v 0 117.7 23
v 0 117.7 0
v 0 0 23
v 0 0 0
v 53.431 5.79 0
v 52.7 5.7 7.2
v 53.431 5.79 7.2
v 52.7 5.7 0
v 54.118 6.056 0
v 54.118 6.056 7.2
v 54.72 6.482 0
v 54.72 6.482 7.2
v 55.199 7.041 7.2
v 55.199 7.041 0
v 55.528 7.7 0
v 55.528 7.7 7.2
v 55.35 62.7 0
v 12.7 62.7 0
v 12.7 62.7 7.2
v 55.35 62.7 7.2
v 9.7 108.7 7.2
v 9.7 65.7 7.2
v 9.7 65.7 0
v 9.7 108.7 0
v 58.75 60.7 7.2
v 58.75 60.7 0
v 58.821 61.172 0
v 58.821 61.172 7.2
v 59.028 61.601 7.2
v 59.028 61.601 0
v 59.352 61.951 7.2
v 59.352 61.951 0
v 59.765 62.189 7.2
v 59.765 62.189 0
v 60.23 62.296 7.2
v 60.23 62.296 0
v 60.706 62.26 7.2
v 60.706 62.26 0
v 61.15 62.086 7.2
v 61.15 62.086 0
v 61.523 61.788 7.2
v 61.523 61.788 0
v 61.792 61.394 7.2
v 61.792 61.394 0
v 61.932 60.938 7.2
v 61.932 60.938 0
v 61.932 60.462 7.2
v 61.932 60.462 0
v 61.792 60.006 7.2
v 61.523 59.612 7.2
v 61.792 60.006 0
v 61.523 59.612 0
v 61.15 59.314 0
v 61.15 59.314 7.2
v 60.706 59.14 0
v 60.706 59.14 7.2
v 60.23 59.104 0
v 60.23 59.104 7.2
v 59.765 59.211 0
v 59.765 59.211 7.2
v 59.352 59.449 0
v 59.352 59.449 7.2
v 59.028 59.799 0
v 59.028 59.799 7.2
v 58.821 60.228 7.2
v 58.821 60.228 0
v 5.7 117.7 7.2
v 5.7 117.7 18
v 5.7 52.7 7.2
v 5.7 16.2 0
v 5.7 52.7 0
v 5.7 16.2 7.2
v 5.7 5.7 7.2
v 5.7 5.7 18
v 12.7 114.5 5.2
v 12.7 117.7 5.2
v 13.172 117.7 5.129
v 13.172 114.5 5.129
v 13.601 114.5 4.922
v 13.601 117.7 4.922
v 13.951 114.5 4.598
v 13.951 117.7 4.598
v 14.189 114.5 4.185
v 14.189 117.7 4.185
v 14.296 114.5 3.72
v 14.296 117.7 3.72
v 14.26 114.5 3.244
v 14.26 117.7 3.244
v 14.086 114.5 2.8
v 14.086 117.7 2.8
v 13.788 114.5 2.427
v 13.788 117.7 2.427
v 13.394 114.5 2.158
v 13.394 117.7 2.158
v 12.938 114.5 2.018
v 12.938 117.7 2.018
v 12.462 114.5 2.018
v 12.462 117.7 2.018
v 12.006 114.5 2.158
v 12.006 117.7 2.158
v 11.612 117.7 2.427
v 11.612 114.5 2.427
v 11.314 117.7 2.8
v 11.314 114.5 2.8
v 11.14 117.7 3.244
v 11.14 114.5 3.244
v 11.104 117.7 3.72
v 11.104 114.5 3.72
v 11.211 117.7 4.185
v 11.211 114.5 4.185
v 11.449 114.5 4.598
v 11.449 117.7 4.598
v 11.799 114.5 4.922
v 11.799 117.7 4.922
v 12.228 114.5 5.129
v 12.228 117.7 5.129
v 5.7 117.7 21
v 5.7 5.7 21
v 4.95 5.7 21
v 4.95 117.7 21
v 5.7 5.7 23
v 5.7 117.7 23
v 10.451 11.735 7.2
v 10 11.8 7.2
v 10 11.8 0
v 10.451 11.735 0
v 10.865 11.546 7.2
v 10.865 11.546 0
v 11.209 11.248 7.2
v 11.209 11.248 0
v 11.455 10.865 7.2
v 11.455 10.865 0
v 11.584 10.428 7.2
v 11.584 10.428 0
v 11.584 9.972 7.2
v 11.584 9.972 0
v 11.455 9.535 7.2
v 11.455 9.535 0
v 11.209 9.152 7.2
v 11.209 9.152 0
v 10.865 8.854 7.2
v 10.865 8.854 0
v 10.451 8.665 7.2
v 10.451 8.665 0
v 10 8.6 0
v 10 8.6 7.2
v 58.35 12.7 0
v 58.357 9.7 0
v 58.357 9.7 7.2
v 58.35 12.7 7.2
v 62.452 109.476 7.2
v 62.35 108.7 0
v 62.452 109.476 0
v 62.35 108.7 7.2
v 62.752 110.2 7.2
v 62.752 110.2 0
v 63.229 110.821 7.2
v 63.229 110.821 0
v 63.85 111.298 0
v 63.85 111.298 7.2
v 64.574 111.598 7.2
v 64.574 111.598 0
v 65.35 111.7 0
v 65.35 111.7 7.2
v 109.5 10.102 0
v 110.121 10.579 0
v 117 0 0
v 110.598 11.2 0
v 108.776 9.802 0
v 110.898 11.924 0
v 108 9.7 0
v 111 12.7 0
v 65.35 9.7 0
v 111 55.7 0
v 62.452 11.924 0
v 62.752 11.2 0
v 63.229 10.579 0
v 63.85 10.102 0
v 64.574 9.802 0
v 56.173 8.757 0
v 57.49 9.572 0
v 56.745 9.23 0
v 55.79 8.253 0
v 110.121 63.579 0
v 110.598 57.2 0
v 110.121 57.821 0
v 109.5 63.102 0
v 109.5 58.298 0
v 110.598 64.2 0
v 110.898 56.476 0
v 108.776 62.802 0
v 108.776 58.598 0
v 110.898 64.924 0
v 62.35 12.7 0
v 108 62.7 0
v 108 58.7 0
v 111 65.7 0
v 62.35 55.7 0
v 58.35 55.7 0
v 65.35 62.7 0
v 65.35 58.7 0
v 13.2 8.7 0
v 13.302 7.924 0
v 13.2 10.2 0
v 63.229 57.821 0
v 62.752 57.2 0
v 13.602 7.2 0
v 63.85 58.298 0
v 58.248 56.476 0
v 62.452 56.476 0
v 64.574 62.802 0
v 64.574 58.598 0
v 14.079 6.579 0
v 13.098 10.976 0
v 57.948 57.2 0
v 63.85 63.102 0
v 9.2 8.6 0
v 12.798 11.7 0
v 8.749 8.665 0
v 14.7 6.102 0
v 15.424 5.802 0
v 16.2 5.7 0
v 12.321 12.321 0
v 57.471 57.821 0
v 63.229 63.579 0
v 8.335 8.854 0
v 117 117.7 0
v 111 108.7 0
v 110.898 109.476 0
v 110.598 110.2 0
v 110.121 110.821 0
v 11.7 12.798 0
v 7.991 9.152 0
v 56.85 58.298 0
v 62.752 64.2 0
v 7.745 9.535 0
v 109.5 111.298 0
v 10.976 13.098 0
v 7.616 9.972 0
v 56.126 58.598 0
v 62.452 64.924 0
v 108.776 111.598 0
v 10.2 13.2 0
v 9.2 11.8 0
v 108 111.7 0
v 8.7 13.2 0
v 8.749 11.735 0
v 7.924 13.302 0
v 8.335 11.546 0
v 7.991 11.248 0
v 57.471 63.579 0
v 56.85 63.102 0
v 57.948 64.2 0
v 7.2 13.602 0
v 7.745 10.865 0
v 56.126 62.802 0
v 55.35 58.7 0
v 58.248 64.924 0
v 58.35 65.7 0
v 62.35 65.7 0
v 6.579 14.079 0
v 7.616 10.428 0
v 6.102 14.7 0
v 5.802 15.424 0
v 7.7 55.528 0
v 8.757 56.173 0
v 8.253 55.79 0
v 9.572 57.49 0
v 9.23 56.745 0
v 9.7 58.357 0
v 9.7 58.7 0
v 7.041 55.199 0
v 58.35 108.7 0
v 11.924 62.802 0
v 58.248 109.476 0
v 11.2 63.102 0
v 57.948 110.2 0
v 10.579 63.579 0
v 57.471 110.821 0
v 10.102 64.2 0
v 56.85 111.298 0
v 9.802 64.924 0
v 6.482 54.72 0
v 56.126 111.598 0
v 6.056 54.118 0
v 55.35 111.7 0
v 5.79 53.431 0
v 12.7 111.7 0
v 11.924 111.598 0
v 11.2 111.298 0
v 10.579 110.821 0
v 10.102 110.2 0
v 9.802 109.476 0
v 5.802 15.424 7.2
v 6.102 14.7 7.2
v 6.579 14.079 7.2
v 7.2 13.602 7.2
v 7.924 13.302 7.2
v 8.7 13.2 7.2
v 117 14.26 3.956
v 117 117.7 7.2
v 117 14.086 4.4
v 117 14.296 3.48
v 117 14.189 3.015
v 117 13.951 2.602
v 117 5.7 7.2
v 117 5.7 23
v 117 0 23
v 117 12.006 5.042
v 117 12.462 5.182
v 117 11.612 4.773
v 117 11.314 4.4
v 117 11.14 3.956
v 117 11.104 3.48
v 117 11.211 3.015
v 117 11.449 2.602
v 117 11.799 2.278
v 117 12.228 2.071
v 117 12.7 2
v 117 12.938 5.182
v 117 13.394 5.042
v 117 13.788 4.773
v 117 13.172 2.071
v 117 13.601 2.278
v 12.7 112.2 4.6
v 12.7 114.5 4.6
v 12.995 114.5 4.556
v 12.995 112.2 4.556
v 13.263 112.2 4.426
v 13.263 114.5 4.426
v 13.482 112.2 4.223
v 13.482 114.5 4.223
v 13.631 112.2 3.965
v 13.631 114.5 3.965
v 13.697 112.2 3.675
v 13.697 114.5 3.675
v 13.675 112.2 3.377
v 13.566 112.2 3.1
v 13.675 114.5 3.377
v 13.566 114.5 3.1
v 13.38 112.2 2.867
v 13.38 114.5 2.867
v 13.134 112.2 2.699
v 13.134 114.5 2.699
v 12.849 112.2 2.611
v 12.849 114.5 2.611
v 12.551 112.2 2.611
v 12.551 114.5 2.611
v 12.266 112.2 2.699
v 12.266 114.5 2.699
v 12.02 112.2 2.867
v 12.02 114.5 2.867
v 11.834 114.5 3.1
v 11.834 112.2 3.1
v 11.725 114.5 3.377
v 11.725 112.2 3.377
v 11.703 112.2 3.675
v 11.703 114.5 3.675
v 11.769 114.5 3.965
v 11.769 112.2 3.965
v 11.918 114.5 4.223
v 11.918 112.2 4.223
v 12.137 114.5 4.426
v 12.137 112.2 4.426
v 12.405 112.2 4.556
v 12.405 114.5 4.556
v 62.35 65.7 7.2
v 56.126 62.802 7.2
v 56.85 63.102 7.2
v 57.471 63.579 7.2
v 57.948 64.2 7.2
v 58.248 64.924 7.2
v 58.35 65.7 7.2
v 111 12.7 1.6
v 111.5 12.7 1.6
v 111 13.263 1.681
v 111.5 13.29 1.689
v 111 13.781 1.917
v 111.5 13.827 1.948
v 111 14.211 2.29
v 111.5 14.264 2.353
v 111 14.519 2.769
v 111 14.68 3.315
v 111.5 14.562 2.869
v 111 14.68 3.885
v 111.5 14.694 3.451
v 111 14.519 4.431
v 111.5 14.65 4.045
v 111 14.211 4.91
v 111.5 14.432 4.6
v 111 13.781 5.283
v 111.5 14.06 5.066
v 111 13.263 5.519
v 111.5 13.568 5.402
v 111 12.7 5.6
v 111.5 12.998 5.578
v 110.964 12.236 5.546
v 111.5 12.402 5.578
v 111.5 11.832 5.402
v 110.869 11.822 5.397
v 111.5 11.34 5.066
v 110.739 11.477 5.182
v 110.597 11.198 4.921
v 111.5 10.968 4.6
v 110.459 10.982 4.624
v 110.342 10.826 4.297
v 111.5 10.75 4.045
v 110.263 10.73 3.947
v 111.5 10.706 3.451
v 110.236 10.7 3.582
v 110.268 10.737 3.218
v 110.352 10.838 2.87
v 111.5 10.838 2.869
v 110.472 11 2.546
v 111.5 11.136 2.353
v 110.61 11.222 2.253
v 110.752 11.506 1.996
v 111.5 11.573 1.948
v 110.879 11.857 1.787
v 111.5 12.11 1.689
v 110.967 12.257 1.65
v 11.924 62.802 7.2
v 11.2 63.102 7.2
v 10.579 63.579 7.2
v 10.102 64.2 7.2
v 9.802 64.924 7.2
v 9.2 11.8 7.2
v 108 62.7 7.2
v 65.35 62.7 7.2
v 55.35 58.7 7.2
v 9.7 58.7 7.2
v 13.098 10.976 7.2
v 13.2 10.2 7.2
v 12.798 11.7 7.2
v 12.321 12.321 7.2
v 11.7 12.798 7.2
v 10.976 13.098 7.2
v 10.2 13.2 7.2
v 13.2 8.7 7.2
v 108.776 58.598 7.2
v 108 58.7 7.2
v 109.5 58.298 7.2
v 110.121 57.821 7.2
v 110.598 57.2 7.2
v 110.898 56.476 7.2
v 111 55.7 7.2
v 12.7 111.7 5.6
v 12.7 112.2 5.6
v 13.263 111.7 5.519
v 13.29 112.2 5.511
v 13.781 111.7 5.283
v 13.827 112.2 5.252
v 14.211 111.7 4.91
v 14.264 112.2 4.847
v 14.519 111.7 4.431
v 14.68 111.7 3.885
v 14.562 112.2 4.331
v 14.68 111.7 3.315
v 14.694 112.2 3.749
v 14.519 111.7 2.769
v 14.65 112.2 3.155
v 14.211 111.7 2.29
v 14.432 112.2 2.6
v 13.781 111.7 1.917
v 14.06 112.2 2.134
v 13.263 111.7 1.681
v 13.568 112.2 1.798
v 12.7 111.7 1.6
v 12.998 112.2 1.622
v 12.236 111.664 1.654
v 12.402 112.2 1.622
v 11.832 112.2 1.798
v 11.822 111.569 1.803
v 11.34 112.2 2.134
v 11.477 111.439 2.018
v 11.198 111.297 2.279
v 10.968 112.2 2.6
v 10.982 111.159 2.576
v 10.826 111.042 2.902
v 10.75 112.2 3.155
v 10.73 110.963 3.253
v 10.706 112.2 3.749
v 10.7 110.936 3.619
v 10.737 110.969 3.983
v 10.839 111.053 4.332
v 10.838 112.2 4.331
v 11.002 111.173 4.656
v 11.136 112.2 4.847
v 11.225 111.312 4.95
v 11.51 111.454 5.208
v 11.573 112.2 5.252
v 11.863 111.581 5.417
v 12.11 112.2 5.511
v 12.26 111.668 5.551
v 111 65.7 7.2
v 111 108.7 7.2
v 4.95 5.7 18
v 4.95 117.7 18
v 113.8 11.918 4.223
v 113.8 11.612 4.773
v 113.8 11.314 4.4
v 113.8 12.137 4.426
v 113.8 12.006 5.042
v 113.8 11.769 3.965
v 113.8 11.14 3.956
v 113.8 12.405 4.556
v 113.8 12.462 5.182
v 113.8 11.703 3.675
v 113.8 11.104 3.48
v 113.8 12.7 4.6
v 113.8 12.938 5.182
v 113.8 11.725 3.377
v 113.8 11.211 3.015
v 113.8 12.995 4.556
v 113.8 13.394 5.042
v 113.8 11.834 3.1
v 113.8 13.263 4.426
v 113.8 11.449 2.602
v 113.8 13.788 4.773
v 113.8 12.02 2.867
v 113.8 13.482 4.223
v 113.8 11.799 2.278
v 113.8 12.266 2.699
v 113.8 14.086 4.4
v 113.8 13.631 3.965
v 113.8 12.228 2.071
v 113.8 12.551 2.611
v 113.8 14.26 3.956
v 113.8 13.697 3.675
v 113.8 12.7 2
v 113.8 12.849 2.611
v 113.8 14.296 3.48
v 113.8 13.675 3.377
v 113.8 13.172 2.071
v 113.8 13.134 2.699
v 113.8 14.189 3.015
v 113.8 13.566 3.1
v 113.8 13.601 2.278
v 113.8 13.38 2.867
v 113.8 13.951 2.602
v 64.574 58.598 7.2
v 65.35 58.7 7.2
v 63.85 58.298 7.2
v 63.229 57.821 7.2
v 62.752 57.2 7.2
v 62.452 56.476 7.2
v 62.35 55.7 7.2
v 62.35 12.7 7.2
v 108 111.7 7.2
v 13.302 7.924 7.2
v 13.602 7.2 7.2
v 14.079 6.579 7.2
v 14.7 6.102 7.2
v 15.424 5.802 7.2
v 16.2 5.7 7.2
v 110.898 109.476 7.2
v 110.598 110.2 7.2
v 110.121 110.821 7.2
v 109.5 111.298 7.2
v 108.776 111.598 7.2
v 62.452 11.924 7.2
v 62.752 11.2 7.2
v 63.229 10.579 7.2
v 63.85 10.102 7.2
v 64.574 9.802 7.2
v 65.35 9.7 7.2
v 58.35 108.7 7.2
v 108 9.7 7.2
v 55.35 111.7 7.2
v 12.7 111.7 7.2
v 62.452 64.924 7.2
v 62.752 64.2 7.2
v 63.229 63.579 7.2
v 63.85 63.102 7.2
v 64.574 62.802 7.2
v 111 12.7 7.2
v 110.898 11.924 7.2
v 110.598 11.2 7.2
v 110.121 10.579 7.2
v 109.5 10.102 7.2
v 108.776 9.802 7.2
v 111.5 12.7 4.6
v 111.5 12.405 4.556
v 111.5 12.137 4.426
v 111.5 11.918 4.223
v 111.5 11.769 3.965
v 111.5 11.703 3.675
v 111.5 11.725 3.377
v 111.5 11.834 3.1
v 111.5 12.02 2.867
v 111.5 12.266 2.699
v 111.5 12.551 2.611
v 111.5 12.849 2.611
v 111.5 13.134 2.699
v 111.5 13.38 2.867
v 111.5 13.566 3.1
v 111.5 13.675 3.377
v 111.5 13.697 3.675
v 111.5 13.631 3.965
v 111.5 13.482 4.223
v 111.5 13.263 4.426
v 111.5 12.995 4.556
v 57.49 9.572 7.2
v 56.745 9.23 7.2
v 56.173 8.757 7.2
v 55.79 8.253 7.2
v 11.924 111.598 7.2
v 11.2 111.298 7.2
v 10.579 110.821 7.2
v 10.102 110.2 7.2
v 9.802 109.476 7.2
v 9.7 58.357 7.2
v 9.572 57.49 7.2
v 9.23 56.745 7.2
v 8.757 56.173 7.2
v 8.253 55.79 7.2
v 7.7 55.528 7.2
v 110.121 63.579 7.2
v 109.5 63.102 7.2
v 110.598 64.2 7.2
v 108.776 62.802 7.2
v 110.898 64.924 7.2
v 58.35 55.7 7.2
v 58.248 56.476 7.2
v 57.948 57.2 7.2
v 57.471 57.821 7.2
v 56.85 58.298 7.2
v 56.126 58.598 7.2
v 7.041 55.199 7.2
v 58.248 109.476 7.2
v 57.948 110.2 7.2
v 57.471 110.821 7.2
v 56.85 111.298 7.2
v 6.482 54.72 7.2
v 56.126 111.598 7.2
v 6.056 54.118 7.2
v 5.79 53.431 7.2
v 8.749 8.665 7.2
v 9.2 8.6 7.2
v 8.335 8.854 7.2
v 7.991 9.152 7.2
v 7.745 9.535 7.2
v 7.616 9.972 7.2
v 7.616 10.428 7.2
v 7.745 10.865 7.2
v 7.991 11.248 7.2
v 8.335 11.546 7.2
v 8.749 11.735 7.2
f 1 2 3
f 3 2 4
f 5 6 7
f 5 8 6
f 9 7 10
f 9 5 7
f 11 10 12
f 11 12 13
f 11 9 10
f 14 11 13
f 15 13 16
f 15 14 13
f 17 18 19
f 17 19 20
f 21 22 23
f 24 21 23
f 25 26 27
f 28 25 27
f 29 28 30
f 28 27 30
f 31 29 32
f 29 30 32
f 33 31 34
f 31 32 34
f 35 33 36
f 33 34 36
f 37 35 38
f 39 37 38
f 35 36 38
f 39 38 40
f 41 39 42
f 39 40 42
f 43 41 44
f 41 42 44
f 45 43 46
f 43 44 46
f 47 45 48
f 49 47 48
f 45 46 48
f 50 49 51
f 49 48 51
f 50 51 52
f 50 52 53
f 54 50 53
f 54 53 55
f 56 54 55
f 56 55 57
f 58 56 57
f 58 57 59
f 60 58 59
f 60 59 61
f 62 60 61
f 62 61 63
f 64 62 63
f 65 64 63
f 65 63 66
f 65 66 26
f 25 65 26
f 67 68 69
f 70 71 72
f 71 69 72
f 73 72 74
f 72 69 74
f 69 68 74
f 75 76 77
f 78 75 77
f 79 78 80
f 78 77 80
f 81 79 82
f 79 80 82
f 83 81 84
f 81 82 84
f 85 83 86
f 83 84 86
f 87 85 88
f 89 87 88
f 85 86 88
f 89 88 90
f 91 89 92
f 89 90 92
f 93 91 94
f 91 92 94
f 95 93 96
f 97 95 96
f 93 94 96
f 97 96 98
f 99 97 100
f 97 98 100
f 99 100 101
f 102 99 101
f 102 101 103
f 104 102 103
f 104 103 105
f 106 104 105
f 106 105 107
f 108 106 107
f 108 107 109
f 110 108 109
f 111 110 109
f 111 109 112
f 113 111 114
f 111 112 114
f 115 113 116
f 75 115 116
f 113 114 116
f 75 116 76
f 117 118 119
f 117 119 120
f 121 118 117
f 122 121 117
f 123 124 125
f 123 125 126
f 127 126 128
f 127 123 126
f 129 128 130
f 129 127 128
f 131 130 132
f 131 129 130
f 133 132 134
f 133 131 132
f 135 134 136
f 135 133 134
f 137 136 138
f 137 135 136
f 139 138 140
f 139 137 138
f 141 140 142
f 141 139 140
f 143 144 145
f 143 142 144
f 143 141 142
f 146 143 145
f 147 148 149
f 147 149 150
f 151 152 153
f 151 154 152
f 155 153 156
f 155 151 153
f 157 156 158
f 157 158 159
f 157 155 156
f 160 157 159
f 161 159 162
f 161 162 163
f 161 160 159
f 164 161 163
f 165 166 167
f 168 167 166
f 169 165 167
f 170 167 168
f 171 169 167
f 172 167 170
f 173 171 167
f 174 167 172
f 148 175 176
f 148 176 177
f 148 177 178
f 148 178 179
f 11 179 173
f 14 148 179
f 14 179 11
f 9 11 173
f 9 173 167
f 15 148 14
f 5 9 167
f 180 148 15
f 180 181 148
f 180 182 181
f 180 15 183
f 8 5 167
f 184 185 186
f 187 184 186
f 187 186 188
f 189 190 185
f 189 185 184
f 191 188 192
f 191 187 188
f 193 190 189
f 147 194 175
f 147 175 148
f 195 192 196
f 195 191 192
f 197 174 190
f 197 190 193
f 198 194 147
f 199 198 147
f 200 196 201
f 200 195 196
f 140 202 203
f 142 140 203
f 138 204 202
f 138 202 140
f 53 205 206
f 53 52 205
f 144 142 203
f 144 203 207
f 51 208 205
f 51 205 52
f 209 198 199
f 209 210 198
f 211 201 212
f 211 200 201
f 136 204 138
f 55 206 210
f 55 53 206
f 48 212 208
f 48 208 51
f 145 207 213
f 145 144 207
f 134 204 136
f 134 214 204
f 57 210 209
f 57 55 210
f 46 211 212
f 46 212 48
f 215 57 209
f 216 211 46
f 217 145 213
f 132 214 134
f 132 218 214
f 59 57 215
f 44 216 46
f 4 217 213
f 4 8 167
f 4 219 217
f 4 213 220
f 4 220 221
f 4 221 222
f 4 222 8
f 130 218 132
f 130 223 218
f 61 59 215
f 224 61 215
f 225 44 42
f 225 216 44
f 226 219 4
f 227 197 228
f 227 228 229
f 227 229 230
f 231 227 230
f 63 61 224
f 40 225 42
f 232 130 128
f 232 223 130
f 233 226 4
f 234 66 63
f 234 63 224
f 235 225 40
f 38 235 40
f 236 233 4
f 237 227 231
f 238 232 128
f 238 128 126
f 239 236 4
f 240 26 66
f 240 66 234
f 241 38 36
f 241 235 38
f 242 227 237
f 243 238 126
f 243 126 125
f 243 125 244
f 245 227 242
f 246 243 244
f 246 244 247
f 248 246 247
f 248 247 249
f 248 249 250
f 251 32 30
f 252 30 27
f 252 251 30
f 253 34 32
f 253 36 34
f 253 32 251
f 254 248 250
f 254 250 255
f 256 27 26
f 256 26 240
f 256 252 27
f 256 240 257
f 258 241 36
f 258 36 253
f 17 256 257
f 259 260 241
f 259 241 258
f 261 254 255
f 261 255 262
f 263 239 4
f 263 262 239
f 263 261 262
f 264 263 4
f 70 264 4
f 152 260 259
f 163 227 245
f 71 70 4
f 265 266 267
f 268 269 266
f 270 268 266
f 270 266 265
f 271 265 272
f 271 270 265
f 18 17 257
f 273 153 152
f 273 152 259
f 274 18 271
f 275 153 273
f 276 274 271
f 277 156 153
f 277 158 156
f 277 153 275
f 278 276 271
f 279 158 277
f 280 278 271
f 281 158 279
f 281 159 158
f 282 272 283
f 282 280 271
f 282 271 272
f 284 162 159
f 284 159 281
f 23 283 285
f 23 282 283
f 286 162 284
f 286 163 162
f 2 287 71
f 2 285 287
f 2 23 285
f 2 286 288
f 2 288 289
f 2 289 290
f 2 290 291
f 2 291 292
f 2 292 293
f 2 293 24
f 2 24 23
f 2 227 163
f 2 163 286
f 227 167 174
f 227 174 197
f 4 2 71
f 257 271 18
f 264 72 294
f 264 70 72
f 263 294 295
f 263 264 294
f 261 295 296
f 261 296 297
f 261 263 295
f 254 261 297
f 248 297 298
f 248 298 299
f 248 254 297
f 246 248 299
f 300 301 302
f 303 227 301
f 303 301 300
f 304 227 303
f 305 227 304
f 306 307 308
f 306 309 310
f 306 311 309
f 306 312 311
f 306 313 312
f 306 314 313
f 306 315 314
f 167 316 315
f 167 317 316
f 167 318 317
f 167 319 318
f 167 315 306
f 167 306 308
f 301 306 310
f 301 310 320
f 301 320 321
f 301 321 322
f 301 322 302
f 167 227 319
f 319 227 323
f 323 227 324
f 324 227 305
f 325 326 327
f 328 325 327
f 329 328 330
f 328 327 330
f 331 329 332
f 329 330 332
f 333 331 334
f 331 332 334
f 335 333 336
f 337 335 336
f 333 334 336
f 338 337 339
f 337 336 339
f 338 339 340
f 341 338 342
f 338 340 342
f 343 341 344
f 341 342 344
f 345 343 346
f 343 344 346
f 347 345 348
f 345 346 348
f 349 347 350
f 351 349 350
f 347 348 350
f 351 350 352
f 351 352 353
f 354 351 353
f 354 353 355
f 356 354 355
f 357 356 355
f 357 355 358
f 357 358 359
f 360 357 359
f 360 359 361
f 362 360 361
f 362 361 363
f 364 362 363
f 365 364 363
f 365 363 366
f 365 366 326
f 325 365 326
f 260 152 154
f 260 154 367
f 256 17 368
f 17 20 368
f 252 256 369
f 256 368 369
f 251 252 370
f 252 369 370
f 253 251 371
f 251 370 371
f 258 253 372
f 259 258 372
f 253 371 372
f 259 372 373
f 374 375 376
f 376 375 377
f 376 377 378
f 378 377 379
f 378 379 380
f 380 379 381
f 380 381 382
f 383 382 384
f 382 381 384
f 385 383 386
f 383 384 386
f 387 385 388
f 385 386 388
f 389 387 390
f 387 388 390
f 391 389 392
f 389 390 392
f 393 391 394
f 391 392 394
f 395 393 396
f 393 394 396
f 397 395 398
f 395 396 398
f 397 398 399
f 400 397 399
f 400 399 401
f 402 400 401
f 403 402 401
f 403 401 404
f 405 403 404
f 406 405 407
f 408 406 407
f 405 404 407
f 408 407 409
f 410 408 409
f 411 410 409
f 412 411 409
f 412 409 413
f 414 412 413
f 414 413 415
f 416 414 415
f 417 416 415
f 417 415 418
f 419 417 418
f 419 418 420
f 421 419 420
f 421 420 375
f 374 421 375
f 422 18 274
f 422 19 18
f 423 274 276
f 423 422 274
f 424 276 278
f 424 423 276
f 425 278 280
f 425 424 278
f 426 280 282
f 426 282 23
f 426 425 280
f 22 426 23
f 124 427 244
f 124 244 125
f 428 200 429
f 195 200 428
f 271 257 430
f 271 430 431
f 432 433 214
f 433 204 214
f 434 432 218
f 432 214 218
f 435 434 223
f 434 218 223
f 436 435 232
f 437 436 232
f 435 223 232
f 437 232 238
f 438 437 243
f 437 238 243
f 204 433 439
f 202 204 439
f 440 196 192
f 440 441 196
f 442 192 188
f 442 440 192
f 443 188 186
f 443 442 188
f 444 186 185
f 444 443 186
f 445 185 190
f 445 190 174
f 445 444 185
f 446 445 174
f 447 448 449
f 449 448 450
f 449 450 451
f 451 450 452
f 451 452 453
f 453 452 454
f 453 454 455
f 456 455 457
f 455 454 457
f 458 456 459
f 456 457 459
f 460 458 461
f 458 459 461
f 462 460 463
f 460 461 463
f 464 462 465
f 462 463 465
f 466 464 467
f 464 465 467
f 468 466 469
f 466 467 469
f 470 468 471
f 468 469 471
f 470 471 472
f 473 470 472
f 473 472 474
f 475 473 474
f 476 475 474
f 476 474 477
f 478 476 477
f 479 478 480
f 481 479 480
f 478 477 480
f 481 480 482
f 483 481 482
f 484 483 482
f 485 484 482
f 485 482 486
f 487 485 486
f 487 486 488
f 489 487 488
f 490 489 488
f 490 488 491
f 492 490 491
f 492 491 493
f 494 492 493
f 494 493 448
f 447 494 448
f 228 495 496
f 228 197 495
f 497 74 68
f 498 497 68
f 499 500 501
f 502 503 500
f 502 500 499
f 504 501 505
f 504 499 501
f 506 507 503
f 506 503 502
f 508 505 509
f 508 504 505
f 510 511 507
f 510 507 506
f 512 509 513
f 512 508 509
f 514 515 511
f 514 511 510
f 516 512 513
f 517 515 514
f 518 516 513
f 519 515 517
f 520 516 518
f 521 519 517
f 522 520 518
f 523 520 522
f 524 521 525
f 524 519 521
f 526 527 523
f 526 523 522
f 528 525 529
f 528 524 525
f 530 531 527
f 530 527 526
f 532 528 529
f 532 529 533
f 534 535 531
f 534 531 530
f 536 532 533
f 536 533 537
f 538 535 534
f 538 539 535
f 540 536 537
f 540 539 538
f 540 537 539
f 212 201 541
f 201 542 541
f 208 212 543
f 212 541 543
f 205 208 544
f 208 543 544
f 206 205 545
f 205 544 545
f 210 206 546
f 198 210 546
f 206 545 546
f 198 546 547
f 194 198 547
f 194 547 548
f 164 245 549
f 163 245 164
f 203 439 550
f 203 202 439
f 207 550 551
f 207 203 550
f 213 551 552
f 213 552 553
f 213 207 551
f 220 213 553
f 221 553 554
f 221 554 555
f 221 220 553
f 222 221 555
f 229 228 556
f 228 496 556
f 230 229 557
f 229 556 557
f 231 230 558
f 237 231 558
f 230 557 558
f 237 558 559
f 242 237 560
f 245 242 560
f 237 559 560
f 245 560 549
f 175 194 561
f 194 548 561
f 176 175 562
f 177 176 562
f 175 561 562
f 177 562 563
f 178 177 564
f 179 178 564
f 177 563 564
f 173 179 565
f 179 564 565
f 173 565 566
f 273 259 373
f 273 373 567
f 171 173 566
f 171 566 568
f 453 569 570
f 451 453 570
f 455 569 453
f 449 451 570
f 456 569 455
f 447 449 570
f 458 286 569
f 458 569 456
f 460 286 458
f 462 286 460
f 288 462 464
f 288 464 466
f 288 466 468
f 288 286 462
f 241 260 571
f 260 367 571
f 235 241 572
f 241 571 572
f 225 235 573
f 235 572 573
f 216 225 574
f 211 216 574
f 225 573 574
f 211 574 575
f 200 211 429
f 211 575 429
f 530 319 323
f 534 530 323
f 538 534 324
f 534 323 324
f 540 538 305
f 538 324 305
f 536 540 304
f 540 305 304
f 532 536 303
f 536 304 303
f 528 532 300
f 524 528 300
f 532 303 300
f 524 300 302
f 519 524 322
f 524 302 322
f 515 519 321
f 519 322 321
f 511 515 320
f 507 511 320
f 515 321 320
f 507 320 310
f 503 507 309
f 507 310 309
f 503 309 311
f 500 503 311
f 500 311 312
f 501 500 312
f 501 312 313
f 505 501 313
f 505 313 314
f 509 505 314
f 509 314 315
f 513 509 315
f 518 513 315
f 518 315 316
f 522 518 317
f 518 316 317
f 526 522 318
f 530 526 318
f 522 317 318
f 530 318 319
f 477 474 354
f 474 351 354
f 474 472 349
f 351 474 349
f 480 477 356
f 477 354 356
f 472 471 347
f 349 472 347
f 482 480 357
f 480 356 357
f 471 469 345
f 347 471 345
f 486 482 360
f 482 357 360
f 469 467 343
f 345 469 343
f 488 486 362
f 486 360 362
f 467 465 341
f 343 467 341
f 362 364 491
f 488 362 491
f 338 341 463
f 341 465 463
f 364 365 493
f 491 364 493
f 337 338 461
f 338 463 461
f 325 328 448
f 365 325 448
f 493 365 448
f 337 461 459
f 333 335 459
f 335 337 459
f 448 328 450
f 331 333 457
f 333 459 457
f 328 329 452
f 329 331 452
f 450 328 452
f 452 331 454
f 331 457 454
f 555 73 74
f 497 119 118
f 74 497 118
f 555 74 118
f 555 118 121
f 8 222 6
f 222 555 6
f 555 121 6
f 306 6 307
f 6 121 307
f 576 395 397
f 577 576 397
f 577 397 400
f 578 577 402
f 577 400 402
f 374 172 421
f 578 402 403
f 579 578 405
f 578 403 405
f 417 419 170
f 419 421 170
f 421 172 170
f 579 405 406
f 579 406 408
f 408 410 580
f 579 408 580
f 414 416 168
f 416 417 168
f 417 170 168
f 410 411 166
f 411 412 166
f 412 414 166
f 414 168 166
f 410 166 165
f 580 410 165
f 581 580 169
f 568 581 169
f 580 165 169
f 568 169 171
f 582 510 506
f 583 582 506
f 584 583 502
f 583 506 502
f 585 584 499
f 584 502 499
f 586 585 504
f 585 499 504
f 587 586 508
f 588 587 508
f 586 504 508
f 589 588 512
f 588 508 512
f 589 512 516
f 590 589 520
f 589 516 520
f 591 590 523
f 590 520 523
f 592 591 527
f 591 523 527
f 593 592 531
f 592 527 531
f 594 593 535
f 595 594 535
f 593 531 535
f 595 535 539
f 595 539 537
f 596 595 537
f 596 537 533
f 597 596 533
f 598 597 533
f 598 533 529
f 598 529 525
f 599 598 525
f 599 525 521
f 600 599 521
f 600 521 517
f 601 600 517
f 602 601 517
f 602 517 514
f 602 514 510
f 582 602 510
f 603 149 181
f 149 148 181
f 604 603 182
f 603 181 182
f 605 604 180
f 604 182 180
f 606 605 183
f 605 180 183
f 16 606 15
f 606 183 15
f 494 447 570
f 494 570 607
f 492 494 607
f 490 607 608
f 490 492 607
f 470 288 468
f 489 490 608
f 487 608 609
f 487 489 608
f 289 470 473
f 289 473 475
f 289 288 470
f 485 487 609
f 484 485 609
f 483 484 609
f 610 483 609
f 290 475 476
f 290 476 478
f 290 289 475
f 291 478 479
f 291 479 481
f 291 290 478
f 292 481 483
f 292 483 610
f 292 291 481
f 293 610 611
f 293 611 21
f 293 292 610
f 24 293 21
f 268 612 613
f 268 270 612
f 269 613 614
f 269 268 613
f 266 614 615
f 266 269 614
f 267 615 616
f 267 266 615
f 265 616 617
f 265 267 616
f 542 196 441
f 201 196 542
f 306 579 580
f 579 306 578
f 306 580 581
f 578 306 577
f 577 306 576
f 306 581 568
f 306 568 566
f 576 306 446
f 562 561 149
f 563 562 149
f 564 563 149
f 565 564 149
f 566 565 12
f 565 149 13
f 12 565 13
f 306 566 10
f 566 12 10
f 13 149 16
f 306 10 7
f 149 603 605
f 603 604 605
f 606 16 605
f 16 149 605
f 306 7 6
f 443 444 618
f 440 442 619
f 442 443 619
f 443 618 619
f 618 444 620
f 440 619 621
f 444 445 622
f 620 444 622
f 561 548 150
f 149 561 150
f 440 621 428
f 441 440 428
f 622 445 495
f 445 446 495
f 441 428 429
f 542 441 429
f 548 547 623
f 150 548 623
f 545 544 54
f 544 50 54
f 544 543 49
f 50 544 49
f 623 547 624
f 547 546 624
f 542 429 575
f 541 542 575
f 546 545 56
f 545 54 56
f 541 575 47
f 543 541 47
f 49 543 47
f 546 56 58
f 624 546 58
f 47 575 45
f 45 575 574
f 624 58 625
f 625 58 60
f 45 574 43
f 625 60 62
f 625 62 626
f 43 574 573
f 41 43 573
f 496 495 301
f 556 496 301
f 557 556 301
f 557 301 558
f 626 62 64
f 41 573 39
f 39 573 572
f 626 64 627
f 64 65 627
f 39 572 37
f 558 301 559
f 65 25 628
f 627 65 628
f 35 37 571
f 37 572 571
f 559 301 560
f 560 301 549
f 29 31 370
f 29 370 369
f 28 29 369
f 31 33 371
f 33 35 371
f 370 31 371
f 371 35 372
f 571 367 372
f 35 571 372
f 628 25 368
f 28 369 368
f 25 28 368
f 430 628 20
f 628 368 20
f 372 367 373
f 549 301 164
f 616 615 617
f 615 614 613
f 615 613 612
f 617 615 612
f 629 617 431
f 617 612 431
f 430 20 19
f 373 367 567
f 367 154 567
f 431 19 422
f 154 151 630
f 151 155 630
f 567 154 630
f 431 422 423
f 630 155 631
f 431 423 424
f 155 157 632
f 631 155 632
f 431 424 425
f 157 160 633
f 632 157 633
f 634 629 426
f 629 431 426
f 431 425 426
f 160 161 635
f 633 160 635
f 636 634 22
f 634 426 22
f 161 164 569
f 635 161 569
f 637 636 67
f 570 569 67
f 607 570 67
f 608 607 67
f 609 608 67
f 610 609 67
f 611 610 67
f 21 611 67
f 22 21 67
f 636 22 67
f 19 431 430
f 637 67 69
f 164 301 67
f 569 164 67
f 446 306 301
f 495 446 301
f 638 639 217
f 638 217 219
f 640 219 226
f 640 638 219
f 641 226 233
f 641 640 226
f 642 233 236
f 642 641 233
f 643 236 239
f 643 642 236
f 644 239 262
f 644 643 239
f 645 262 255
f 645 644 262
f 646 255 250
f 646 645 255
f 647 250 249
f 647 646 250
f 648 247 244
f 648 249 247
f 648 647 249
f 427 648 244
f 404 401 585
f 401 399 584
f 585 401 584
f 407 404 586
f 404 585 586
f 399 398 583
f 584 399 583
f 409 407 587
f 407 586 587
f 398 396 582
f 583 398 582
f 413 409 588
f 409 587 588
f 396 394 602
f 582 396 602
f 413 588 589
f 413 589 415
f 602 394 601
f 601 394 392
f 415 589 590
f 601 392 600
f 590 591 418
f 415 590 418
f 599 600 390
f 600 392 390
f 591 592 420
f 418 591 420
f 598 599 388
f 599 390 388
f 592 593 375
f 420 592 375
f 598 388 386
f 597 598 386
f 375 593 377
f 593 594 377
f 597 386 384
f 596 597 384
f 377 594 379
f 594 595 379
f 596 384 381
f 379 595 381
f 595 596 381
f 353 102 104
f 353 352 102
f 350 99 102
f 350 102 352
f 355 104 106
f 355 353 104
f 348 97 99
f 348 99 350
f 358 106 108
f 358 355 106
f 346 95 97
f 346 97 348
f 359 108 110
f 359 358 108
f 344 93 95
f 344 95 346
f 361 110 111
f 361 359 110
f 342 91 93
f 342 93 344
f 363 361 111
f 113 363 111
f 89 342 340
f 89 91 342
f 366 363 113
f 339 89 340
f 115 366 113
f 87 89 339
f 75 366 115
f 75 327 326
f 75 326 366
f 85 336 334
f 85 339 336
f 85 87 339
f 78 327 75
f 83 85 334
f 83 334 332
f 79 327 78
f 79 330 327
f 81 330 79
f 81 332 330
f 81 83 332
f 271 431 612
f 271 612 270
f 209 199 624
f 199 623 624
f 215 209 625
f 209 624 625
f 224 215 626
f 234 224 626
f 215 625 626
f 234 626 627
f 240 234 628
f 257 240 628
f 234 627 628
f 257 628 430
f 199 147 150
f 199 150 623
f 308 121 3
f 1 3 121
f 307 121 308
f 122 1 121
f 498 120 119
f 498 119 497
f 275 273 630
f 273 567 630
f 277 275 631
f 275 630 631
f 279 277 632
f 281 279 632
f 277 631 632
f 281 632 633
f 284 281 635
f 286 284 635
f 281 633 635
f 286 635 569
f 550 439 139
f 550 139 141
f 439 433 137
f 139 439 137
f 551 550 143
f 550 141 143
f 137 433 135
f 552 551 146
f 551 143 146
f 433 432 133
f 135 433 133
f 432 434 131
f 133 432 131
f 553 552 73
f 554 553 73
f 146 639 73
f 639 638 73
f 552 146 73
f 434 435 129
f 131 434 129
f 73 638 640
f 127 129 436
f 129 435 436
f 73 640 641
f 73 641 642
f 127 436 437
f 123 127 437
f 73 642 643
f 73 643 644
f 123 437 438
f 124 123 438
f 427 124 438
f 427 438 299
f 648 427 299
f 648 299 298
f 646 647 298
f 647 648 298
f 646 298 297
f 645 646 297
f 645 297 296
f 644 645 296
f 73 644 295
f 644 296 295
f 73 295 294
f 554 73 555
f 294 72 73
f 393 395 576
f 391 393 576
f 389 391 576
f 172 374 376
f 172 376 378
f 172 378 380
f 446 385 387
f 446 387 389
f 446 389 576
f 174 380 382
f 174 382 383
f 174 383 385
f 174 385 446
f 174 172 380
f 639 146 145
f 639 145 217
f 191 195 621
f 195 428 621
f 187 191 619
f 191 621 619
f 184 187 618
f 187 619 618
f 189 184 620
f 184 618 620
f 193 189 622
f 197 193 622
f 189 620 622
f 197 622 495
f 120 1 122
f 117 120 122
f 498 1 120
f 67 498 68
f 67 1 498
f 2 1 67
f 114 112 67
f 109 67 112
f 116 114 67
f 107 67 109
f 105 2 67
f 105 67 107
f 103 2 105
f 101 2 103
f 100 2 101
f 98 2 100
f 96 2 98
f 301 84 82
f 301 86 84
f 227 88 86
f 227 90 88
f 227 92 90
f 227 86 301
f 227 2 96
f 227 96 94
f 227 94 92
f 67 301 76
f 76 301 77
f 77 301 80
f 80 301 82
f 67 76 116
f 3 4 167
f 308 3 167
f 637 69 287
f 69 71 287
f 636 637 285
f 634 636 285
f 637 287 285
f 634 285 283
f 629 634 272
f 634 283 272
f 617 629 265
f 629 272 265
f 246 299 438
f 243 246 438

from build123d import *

# Parameters (mm, degrees)
BOSS_EXTRUDE1_DEPTH            = 23
SKETCH2_W                      = 3
SKETCH2_H                      = 112
CUT_EXTRUDE1_DEPTH             = 0.75
SKETCH3_W                      = 7.2
SKETCH3_H                      = 6
BOSS_EXTRUDE2_DEPTH            = 10
SKETCH3_3_W                    = 7.2
SKETCH3_3_H                    = 106
BOSS_EXTRUDE3_DEPTH            = 4
FILLET1_R                      = 3
SKETCH5_W                      = 101.3
SKETCH5_H                      = 7.2
BOSS_EXTRUDE4_DEPTH            = 4
SKETCH5_3_W                    = 6
SKETCH5_3_H                    = 7.2
BOSS_EXTRUDE5_DEPTH            = 10
FILLET3_R                      = 3
SKETCH6_W                      = 50
SKETCH6_H                      = 50
CUT_EXTRUDE2_DEPTH             = 167.709117927
FILLET8_R                      = 3
FILLET9_R                      = 3
FILLET10_R                     = 3
FILLET11_R                     = 3
CUT_EXTRUDE3_REACH             = 169.545
SKETCH7_R                      = 1
CUT_EXTRUDE3_DIRECTION_2_DEPTH = 168.544889647
SKETCH7_5_R                    = 1.6
SKETCH7_5_R_2                  = 1
CUT_EXTRUDE4_DEPTH             = 3.2
CUT_EXTRUDE6_START             = -5.5
SKETCH8_R                      = 2
CUT_EXTRUDE6_DEPTH             = 3
CUT_EXTRUDE7_REACH             = 169.545
SKETCH9_R                      = 1
SKETCH9_3_R                    = 1.6
SKETCH9_3_R_2                  = 1
CUT_EXTRUDE8_DEPTH             = 3.2
CUT_EXTRUDE9_START             = -5.5
SKETCH10_R                     = 2
CUT_EXTRUDE9_DEPTH             = 3.2
BOSS_EXTRUDE6_DEPTH            = 7.2
FILLET12_R                     = 3
BOSS_EXTRUDE7_DEPTH            = 7.2
FILLET13_R                     = 3
FILLET14_R                     = 3
FILLET15_R                     = 3
FILLET16_R                     = 3
BOSS_EXTRUDE8_DEPTH            = 7.2
CUT_EXTRUDE10_REACH            = 168.709
CUT_EXTRUDE11_DEPTH            = 7.2
FILLET17_R                     = 3
CUT_EXTRUDE12_REACH            = 169.545
SKETCH16_R                     = 1.6


with BuildPart() as part:
    # Sketch1 → Boss-Extrude1 (new body)
    with BuildSketch(Plane.XY):
        Polygon((0, 117.7), (0, 0), (117, 0), (117, 5.7), (5.7, 5.7), (5.7, 117.7), align=None)
    extrude(amount=BOSS_EXTRUDE1_DEPTH)

    # Sketch2 → Cut-Extrude1 (cut)
    with BuildSketch(Plane(origin=(5.7, 0, 0), x_dir=(0, 0, -1), z_dir=(1, 0, 0))):
        with Locations((-19.5, 61.7)):
            Rectangle(SKETCH2_W, SKETCH2_H)
    extrude(amount=-CUT_EXTRUDE1_DEPTH, mode=Mode.SUBTRACT)

    # Sketch3 → Boss-Extrude2 (add)
    with BuildSketch(Plane(origin=(5.7, 0, 0), x_dir=(0, 0, -1), z_dir=(1, 0, 0))):
        with Locations((-3.6, 114.7)):
            Rectangle(SKETCH3_W, SKETCH3_H)
    extrude(amount=BOSS_EXTRUDE2_DEPTH)

    # Sketch3<3> → Boss-Extrude3 (add)
    with BuildSketch(Plane(origin=(5.7, 0, 0), x_dir=(0, 0, -1), z_dir=(1, 0, 0))):
        with Locations((-3.6, 58.7)):
            Rectangle(SKETCH3_3_W, SKETCH3_3_H)
    extrude(amount=BOSS_EXTRUDE3_DEPTH)

    # Fillet1
    fillet1_edges = [part.edges().sort_by_distance(p)[0] for p in [
        (9.7, 111.7, 3.6),
    ]]
    fillet(fillet1_edges, radius=FILLET1_R)

    # Sketch5 → Boss-Extrude4 (add)
    with BuildSketch(Plane(origin=(0, 5.7, 0), x_dir=(1, 0, 0), z_dir=(0, 1, 0))):
        with Locations((60.35, -3.6)):
            Rectangle(SKETCH5_W, SKETCH5_H)
    extrude(amount=BOSS_EXTRUDE4_DEPTH)

    # Sketch5<3> → Boss-Extrude5 (add)
    with BuildSketch(Plane(origin=(0, 5.7, 0), x_dir=(1, 0, 0), z_dir=(0, 1, 0))):
        with Locations((114, -3.6)):
            Rectangle(SKETCH5_3_W, SKETCH5_3_H)
    extrude(amount=BOSS_EXTRUDE5_DEPTH)

    # Fillet3
    fillet3_edges = [part.edges().sort_by_distance(p)[0] for p in [
        (111, 9.7, 3.6),
    ]]
    fillet(fillet3_edges, radius=FILLET3_R)

    # Sketch6 → Cut-Extrude2 (cut, through all)
    with BuildSketch(Plane.XY.offset(7.2)):
        with Locations((30.7, 30.7)):
            Rectangle(SKETCH6_W, SKETCH6_H)
    extrude(amount=-CUT_EXTRUDE2_DEPTH, mode=Mode.SUBTRACT)

    # Fillet8
    fillet8_edges = [part.edges().sort_by_distance(p)[0] for p in [
        (5.7, 55.7, 3.6),
    ]]
    fillet(fillet8_edges, radius=FILLET8_R)

    # Fillet9
    fillet9_edges = [part.edges().sort_by_distance(p)[0] for p in [
        (9.7, 55.7, 3.6),
    ]]
    fillet(fillet9_edges, radius=FILLET9_R)

    # Fillet10
    fillet10_edges = [part.edges().sort_by_distance(p)[0] for p in [
        (55.7, 5.7, 3.6),
    ]]
    fillet(fillet10_edges, radius=FILLET10_R)

    # Fillet11
    fillet11_edges = [part.edges().sort_by_distance(p)[0] for p in [
        (55.7, 9.7, 3.6),
    ]]
    fillet(fillet11_edges, radius=FILLET11_R)

    # Sketch7 → Cut-Extrude3 (cut, up to next)
    with BuildSketch(Plane(origin=(117, 0, 0), x_dir=(0, 0, -1), z_dir=(1, 0, 0)), mode=Mode.PRIVATE) as cut_extrude3_sk1:
        with Locations(Location((-3.6, 12.7, 0), (0, 0, 180))):
            Circle(SKETCH7_R)
    cut_extrude3_tool1 = extrude(cut_extrude3_sk1.sketch, amount=-CUT_EXTRUDE3_REACH, mode=Mode.PRIVATE) & part.part
    add(cut_extrude3_tool1.solids().sort_by_distance((117, 12.7, 3.6))[0], mode=Mode.SUBTRACT)

    # Sketch7 → Cut-Extrude3 direction 2 (cut)
    with BuildSketch(Plane(origin=(117, 0, 0), x_dir=(0, 0, -1), z_dir=(1, 0, 0))):
        with Locations(Location((-3.6, 12.7, 0), (0, 0, 180))):
            Circle(SKETCH7_R)
    extrude(amount=CUT_EXTRUDE3_DIRECTION_2_DEPTH, mode=Mode.SUBTRACT)

    # Sketch7<5> → Cut-Extrude4 (cut)
    with BuildSketch(Plane(origin=(117, 0, 0), x_dir=(0, 0, -1), z_dir=(1, 0, 0))):
        with Locations((-3.6, 12.7)):
            Circle(SKETCH7_5_R)
        with Locations((-3.6, 12.7)):
            Circle(SKETCH7_5_R_2, mode=Mode.SUBTRACT)
    extrude(amount=-CUT_EXTRUDE4_DEPTH, mode=Mode.SUBTRACT)

    # Sketch8 → Cut-Extrude6 (cut)
    with BuildSketch(Plane(origin=(117, 0, 0), x_dir=(0, 0, -1), z_dir=(1, 0, 0)).offset(CUT_EXTRUDE6_START)):
        with Locations((-3.6, 12.7)):
            Circle(SKETCH8_R)
    extrude(amount=-CUT_EXTRUDE6_DEPTH, mode=Mode.SUBTRACT)

    # Sketch9 → Cut-Extrude7 (cut, up to next)
    with BuildSketch(Plane(origin=(0, 117.7, 0), x_dir=(1, 0, 0), z_dir=(0, 1, 0)), mode=Mode.PRIVATE) as cut_extrude7_sk1:
        with Locations(Location((12.7, -3.6, 0), (0, 0, 270))):
            Circle(SKETCH9_R)
    cut_extrude7_tool1 = extrude(cut_extrude7_sk1.sketch, amount=-CUT_EXTRUDE7_REACH, mode=Mode.PRIVATE) & part.part
    add(cut_extrude7_tool1.solids().sort_by_distance((12.7, 117.7, 3.6))[0], mode=Mode.SUBTRACT)

    # Sketch9<3> → Cut-Extrude8 (cut)
    with BuildSketch(Plane(origin=(0, 117.7, 0), x_dir=(1, 0, 0), z_dir=(0, 1, 0))):
        with Locations(Location((12.7, -3.6, 0), (0, 0, 270))):
            Circle(SKETCH9_3_R)
        with Locations(Location((12.7, -3.6, 0), (0, 0, 270))):
            Circle(SKETCH9_3_R_2, mode=Mode.SUBTRACT)
    extrude(amount=-CUT_EXTRUDE8_DEPTH, mode=Mode.SUBTRACT)

    # Sketch10 → Cut-Extrude9 (cut)
    with BuildSketch(Plane(origin=(0, 117.7, 0), x_dir=(1, 0, 0), z_dir=(0, 1, 0)).offset(CUT_EXTRUDE9_START)):
        with Locations(Location((12.7, -3.6, 0), (0, 0, 270))):
            Circle(SKETCH10_R)
    extrude(amount=-CUT_EXTRUDE9_DEPTH, mode=Mode.SUBTRACT)

    # Sketch11 → Boss-Extrude6 (add)
    with BuildSketch(Plane(origin=(0, 0, 0), x_dir=(-1, 0, 0), z_dir=(0, 0, -1))):
        Polygon((-117, 15.7), (-111, 15.7), (-111, 111.7), (-15.7, 111.7), (-15.7, 117.7), (-63.35, 117.7), (-117, 117.7), align=None)
    extrude(amount=-BOSS_EXTRUDE6_DEPTH)

    # Fillet12
    fillet12_edges = [part.edges().sort_by_distance(p)[0] for p in [
        (111, 111.7, 3.6),
    ]]
    fillet(fillet12_edges, radius=FILLET12_R)

    # Sketch12 → Boss-Extrude7 (add)
    with BuildSketch(Plane(origin=(0, 0, 0), x_dir=(-1, 0, 0), z_dir=(0, 0, -1))):
        Polygon((-62.35, 12.7), (-62.35, 9.7), (-58.356854249, 9.7), (-58.35, 12.7), (-58.35, 58.7), (-9.7, 58.7), (-9.7, 62.7), (-58.35, 62.7), (-58.35, 108.7), (-58.35, 111.7), (-62.35, 111.7), (-62.35, 108.7), (-62.35, 62.7), (-111, 62.7), (-111, 58.7), (-62.35, 58.7), align=None)
    extrude(amount=-BOSS_EXTRUDE7_DEPTH)

    # Fillet13
    fillet13_edges = [part.edges().sort_by_distance(p)[0] for p in [
        (111, 62.7, 3.6),
        (62.35, 62.7, 3.6),
        (62.35, 111.7, 3.6),
    ]]
    fillet(fillet13_edges, radius=FILLET13_R)

    # Fillet14
    fillet14_edges = [part.edges().sort_by_distance(p)[0] for p in [
        (111, 58.7, 3.6),
        (62.35, 9.7, 3.6),
        (62.35, 58.7, 3.6),
    ]]
    fillet(fillet14_edges, radius=FILLET14_R)

    # Fillet15
    fillet15_edges = [part.edges().sort_by_distance(p)[0] for p in [
        (58.35, 111.7, 3.6),
        (58.35, 62.7, 3.6),
        (9.7, 62.7, 3.6),
    ]]
    fillet(fillet15_edges, radius=FILLET15_R)

    # Fillet16
    fillet16_edges = [part.edges().sort_by_distance(p)[0] for p in [
        (58.35, 58.7, 3.6),
    ]]
    fillet(fillet16_edges, radius=FILLET16_R)

    # Sketch13 → Boss-Extrude8 (add)
    with BuildSketch(Plane(origin=(0, 0, 0), x_dir=(-1, 0, 0), z_dir=(0, 0, -1))):
        Polygon((-5.7, 20.7), (-20.7, 5.7), (-5.7, 5.7), align=None)
    extrude(amount=-BOSS_EXTRUDE8_DEPTH)

    # Sketch14 → Cut-Extrude10 (cut, up to next)
    with BuildSketch(Plane.XY.offset(7.2), mode=Mode.PRIVATE) as cut_extrude10_sk1:
        with BuildLine():
            Line((10, 8.6), (9.2, 8.6))
            ThreePointArc((9.2, 8.6), (7.6, 10.2), (9.2, 11.8))
            Line((9.2, 11.8), (10, 11.8))
            ThreePointArc((10, 11.8), (11.6, 10.2), (10, 8.6))
        make_face()
    cut_extrude10_tool1 = extrude(cut_extrude10_sk1.sketch, amount=-CUT_EXTRUDE10_REACH, mode=Mode.PRIVATE) & part.part
    add(cut_extrude10_tool1.solids().sort_by_distance((9.6, 10.2, 7.2))[0], mode=Mode.SUBTRACT)

    # Sketch15 → Cut-Extrude11 (cut)
    with BuildSketch(Plane.XY.offset(7.2)):
        Polygon((13.2, 5.7), (20.7, 5.7), (13.2, 13.2), align=None)
        Polygon((5.7, 13.2), (13.2, 13.2), (5.7, 20.7), align=None)
        Polygon((13.2, 13.2), (20.7, 5.7), (20.7, 13.2), (20.7, 20.7), (13.2, 20.7), (5.7, 20.7), align=None)
    extrude(amount=-CUT_EXTRUDE11_DEPTH, mode=Mode.SUBTRACT)

    # Fillet17
    fillet17_edges = [part.edges().sort_by_distance(p)[0] for p in [
        (5.7, 13.2, 3.6),
        (13.2, 5.7, 3.6),
        (13.2, 13.2, 3.6),
    ]]
    fillet(fillet17_edges, radius=FILLET17_R)

    # Sketch16 → Cut-Extrude12 (cut, up to next)
    with BuildSketch(Plane(origin=(0, 0, 0), x_dir=(-1, 0, 0), z_dir=(0, 0, -1)), mode=Mode.PRIVATE) as cut_extrude12_sk1:
        with Locations((-60.35, 60.7)):
            Circle(SKETCH16_R)
    cut_extrude12_tool1 = extrude(cut_extrude12_sk1.sketch, amount=-CUT_EXTRUDE12_REACH, mode=Mode.PRIVATE) & part.part
    add(cut_extrude12_tool1.solids().sort_by_distance((60.35, 60.7, 0))[0], mode=Mode.SUBTRACT)


solid = part.part
